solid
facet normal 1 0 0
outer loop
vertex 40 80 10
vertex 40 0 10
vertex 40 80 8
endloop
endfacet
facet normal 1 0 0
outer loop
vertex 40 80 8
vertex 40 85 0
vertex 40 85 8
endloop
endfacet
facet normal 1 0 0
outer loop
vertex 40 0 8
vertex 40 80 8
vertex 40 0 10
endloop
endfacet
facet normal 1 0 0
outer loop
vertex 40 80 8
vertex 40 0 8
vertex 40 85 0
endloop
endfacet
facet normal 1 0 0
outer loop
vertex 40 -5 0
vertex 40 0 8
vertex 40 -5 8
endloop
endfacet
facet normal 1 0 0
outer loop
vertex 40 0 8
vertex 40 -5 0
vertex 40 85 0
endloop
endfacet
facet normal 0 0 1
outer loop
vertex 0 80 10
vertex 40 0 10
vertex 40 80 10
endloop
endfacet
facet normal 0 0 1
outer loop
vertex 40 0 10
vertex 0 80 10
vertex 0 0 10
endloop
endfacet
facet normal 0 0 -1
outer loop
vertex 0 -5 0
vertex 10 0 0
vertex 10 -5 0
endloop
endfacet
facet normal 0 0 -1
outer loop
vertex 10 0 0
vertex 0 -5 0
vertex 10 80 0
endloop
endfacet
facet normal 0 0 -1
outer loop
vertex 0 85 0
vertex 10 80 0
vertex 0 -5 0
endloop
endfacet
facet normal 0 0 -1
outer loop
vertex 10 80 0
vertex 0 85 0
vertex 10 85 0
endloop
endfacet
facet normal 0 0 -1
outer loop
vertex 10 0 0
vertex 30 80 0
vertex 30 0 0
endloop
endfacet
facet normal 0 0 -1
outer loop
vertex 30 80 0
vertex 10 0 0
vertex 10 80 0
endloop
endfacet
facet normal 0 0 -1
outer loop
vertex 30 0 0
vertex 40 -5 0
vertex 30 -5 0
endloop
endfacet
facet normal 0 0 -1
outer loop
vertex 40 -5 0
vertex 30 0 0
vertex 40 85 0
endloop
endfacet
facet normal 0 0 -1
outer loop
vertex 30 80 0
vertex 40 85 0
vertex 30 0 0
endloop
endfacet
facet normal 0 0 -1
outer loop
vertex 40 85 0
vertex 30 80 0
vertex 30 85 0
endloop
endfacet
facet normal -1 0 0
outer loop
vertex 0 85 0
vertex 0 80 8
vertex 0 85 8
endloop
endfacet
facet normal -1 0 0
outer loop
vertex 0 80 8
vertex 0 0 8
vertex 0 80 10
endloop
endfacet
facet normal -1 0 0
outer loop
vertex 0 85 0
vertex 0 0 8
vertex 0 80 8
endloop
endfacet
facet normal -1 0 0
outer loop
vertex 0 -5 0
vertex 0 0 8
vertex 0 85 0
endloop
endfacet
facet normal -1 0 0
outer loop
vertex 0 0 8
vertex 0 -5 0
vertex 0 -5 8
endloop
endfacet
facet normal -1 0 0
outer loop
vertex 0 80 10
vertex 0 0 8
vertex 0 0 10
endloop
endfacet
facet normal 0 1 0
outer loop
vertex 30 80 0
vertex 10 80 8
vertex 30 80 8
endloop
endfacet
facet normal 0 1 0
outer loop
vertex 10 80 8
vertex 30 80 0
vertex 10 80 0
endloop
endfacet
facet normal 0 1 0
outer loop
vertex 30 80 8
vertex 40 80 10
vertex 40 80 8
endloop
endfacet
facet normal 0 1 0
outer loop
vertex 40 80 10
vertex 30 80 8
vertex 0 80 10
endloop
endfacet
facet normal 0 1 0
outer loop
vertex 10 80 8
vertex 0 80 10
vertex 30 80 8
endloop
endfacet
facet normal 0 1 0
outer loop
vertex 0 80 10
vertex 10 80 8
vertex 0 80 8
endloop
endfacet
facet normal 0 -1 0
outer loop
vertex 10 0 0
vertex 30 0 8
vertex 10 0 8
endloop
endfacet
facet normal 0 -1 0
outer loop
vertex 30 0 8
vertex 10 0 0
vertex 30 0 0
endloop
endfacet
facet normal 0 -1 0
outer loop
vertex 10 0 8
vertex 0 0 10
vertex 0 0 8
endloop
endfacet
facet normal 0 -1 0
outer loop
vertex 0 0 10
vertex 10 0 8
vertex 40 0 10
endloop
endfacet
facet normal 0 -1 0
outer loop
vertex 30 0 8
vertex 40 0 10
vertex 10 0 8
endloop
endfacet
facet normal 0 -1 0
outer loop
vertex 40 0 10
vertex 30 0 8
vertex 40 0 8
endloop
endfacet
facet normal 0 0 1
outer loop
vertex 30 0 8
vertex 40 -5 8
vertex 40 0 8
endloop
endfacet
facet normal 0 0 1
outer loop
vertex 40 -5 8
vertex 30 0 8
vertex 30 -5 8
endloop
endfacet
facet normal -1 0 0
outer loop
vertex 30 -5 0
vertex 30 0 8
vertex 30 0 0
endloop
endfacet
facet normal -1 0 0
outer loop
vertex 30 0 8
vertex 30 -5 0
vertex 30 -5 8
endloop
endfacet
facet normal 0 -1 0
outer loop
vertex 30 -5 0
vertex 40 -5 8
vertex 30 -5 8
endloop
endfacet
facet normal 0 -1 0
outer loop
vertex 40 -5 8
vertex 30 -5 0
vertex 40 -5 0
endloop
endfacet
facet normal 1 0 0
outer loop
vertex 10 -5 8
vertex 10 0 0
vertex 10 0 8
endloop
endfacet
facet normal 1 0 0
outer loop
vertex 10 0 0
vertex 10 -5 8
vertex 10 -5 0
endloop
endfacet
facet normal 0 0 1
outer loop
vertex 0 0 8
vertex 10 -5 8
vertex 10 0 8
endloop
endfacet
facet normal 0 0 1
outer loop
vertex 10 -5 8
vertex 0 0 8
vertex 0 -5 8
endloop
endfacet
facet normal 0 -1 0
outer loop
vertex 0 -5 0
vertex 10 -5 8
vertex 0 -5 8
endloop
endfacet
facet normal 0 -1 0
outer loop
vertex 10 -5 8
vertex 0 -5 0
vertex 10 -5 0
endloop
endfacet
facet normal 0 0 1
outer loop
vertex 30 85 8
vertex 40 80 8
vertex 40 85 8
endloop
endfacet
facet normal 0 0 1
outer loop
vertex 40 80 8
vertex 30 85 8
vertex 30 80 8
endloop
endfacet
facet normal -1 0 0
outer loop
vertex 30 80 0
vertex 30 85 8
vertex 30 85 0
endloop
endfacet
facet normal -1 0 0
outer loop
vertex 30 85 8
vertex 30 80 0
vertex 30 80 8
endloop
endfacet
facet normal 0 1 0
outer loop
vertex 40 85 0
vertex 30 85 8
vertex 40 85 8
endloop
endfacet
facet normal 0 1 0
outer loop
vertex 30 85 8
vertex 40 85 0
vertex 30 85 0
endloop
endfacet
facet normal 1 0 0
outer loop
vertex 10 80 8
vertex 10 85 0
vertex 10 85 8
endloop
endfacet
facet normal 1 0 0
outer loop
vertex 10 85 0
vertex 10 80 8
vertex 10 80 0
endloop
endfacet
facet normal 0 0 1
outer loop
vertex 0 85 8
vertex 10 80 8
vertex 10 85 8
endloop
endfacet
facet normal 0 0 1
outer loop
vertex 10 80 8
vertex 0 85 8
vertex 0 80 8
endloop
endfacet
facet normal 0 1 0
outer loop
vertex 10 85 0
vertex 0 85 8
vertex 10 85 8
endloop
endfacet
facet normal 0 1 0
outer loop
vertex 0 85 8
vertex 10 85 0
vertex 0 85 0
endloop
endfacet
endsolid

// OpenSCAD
module FrexyBackInsert(
insert_width = 40,
insert_length = 80,
side_cube_width = 10,
side_cube_length = 5,
height=10,
base_height = 8
) {
    union() {
        cube([insert_width, insert_length, height]);
        translate([insert_width - side_cube_width, -side_cube_length, 0])
            cube([side_cube_width, side_cube_length, base_height]);
        translate([0, -side_cube_length, 0])
            cube([side_cube_width, side_cube_length, base_height]);
        translate([insert_width - side_cube_width, insert_length, 0])
            cube([side_cube_width, side_cube_length, base_height]);
        translate([0, insert_length, 0])
            cube([side_cube_width, side_cube_length, base_height]);
    }
}

FrexyBackInsert();
